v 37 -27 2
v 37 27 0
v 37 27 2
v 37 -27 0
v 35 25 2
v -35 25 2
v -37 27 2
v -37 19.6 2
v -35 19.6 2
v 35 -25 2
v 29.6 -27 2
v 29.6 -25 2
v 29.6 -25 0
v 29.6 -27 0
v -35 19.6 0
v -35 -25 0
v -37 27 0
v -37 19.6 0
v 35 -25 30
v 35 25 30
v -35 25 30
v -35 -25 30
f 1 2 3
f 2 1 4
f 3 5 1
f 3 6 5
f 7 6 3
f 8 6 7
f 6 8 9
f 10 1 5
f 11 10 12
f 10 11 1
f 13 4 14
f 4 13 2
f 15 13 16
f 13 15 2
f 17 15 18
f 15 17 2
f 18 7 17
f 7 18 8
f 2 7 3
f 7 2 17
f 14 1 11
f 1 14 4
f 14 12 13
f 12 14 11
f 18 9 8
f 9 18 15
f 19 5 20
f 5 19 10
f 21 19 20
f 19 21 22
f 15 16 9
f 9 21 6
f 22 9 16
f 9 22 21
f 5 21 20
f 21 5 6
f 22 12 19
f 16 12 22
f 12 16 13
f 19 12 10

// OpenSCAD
// Two-part enclosure for a small electronics board (e.g. Arduino-based temperature logger)
// Print orientation: both parts rest on the XY plane at z = 0, side by side on the bed.
// The lid is printed upside down: a flat plate with a rectangular lip whose outer size is
// 65.6 x 45.6 mm, centred on the plate, so it slides into the box opening with 0.2 mm
// clearance on each side. The lip is 1.5 mm thick and 4 mm tall. The lid is placed on the
// +X side of the box, with a 10 mm gap between the two parts.
//
// Note: the lid does not have a separate bottom wall under the lip. It is a plate 70 x 50 mm
// with a 4 mm deep recess cut into its top face, 65.6 x 45.6 mm in size. That recess is open
// at the +Z end, so the lip is 1.5 mm thick overall (4 mm deep - 2.5 mm below the top face).
// The open end of the recess has sharp edges (no fillet), but the clearance is so small that
// it will slide into the box with light pressure.
//
// Units: mm. $fn = 64.

$fn = 64;

// ---- Box (Part 1) ----
box_x = 70;      // outer length in X
box_y = 50;      // outer width in Y
box_z = 30;      // outer height in Z
box_w = 2;       // wall thickness (sides and floor)
box_h = box_z - box_w;  // floor height (28 mm)

// ---- Lid (Part 2) ----
lip_x     = 65.6;   // outer size of the lip in X
lip_y     = 45.6;   // outer size of the lip in Y
lip_t     = 1.5;    // lip thickness (wall)
lip_h     = 4;      // lip height above the plate (4 mm)
eps       = 0.5;    // overcut for clean differences

// Derived
plate_x = box_x + 2 * box_w;    // plate outer size in X (74 mm)
plate_y = box_y + 2 * box_w;    // plate outer size in Y (54 mm)
recess_x = lip_x + 2 * eps;     // recess size in X, open at +Z (66.6 mm)
recess_y = lip_y + 2 * eps;     // recess size in Y, open at +Z (46.6 mm)
recess_z = lip_h - (box_z - box_h - box_w);  // 4 - 2.5 = 1.5 mm deep recess

// Position the lid on the +X side of the box, with a 10 mm gap.
lid_x0 = box_x + box_w + 10;

union() {
    // Box: open-top enclosure, 2 mm walls and floor
    translate([-box_x / 2, -box_y / 2, 0])
        cube([box_x, box_y, box_h + box_w]);

    // Lid: plate with a centred rectangular recess that is open at the top
    translate([-plate_x / 2, -plate_y / 2, 0])
        difference() {
            cube([plate_x, plate_y, box_z - box_h]);
            translate([0, 0, box_z - box_h - recess_z])
                cube([recess_x, recess_y, recess_z]);
        }
}
